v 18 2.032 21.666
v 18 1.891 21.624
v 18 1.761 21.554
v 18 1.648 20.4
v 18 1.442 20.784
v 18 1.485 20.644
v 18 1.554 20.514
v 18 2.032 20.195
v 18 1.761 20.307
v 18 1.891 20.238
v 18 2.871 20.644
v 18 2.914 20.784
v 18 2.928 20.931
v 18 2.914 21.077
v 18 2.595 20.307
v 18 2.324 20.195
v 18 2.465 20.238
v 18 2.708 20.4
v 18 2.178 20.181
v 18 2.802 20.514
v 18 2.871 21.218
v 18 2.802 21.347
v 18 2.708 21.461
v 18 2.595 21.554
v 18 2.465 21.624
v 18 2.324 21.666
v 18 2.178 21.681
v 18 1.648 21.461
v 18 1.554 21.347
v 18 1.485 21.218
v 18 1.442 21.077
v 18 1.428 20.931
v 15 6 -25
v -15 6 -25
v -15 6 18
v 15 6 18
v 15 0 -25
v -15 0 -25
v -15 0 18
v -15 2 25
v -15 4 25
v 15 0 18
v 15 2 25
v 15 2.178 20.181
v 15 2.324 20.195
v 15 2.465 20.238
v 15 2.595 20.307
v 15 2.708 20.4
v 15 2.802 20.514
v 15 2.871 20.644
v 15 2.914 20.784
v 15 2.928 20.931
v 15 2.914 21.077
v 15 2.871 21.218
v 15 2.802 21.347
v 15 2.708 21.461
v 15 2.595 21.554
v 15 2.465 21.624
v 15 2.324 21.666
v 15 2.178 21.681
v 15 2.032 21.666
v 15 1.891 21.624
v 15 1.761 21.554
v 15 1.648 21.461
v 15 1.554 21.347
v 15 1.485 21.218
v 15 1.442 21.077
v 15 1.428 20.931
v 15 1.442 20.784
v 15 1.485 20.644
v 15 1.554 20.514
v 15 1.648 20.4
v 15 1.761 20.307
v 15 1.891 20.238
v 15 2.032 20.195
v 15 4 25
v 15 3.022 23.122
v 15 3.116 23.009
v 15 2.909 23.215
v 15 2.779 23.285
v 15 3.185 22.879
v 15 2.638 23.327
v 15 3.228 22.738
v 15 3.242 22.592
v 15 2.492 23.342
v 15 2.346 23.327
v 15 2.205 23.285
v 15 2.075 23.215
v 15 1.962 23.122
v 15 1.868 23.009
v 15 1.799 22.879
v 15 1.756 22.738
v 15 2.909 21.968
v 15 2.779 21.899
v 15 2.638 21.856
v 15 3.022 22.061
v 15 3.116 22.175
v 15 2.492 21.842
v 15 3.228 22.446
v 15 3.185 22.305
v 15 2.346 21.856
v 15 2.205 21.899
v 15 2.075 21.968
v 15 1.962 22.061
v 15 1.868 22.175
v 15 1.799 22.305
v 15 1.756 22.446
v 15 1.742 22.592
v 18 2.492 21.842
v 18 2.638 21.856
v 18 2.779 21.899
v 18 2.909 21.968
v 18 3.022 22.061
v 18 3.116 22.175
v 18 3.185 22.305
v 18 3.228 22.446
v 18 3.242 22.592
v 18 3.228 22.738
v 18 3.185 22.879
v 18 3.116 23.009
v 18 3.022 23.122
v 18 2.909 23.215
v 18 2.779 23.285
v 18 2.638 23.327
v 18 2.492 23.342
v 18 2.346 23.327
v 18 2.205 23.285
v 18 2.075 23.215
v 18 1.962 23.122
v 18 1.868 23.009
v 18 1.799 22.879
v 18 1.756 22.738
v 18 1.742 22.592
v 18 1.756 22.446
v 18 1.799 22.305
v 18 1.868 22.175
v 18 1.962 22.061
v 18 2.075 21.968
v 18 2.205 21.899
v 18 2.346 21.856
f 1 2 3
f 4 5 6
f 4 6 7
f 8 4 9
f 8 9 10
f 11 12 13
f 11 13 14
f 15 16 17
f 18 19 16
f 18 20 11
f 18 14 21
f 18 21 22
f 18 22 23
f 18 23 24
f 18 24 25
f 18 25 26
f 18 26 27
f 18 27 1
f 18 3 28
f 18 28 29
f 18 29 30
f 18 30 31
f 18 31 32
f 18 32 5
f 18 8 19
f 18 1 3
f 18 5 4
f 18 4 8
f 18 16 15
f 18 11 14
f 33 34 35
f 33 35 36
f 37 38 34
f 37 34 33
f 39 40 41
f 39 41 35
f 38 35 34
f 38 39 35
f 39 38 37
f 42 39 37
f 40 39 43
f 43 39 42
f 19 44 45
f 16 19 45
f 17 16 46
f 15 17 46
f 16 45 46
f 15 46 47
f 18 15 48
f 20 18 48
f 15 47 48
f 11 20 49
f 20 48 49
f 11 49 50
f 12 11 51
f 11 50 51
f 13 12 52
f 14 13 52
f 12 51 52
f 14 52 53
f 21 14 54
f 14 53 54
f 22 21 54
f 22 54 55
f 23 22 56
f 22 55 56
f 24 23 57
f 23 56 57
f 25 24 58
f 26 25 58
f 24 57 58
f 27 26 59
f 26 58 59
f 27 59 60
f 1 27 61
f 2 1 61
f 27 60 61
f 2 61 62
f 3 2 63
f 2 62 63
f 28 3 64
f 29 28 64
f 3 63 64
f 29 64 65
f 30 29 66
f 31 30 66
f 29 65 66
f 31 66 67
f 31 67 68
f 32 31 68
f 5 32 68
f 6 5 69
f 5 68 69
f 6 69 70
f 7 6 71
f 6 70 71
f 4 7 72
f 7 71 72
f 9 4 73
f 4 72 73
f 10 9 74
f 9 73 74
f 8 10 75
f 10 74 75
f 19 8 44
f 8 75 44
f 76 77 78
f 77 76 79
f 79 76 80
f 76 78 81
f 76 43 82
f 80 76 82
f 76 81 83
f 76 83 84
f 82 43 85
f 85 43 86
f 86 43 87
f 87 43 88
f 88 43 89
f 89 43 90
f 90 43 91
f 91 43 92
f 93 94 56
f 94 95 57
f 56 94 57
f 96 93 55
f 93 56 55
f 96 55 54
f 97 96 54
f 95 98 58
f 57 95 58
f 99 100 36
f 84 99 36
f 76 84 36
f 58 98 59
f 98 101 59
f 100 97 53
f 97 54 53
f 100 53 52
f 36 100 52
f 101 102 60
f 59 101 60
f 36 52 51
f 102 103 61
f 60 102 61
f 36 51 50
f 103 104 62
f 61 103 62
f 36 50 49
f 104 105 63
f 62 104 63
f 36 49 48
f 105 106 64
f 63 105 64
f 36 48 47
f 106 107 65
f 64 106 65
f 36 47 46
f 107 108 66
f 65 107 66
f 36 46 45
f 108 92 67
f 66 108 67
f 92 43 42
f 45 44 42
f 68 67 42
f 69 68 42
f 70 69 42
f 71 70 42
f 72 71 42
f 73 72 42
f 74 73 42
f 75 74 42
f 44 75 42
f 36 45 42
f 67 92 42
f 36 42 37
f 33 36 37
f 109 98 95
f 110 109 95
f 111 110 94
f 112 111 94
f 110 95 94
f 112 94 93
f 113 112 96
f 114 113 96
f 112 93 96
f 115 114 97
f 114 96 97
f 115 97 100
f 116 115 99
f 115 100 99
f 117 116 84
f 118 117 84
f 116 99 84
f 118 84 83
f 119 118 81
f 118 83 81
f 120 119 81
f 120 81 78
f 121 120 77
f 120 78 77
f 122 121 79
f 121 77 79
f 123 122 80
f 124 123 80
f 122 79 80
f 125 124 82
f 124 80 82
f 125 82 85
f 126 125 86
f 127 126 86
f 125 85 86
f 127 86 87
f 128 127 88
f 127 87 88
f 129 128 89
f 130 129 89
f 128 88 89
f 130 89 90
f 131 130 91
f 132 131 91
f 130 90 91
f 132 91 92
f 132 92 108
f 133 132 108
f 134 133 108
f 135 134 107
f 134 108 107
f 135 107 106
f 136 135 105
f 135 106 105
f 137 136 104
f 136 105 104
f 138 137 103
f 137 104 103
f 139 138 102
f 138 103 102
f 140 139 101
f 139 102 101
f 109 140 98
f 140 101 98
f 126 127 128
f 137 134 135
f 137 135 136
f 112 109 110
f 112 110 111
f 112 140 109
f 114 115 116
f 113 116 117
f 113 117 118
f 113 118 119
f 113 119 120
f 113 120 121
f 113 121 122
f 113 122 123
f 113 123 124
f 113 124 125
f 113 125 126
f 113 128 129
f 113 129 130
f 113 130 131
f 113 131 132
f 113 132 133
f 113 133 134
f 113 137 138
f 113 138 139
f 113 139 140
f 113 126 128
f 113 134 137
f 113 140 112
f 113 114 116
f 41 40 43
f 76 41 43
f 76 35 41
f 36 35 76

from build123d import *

# Parameters (mm, degrees)
SKETCH1_W           = 30
SKETCH1_H           = 50
BOSS_EXTRUDE1_DEPTH = 6
CHAMFER1_SIZE       = 2
CHAMFER1_SIZE2      = 7
SKETCH2_R           = 0.75
BOSS_EXTRUDE2_DEPTH = 3


with BuildPart() as part:
    # Sketch1 → Boss-Extrude1 (new body)
    with BuildSketch(Plane(origin=(0, 0, 0), x_dir=(1, 0, 0), z_dir=(0, 1, 0))):
        Rectangle(SKETCH1_W, SKETCH1_H)
    extrude(amount=BOSS_EXTRUDE1_DEPTH)

    # Chamfer1
    chamfer1_edges = [part.edges().sort_by_distance(p)[0] for p in [
        (0, 0, 25),
        (0, 6, 25),
    ]]
    chamfer1_side = [part.faces().sort_by_distance(p)[0] for p in [
        (0, 3, 25),
    ]]
    chamfer(chamfer1_edges, length=CHAMFER1_SIZE, length2=CHAMFER1_SIZE2, reference=chamfer1_side[0])

    # Sketch2 → Boss-Extrude2 (add)
    with BuildSketch(Plane(origin=(15, 0, 0), x_dir=(0, 0, -1), z_dir=(1, 0, 0))):
        with Locations((-22.591828887, 2.491974932)):
            Circle(SKETCH2_R)
        with Locations((-20.930691136, 2.177979382)):
            Circle(SKETCH2_R)
    extrude(amount=BOSS_EXTRUDE2_DEPTH)


solid = part.part
